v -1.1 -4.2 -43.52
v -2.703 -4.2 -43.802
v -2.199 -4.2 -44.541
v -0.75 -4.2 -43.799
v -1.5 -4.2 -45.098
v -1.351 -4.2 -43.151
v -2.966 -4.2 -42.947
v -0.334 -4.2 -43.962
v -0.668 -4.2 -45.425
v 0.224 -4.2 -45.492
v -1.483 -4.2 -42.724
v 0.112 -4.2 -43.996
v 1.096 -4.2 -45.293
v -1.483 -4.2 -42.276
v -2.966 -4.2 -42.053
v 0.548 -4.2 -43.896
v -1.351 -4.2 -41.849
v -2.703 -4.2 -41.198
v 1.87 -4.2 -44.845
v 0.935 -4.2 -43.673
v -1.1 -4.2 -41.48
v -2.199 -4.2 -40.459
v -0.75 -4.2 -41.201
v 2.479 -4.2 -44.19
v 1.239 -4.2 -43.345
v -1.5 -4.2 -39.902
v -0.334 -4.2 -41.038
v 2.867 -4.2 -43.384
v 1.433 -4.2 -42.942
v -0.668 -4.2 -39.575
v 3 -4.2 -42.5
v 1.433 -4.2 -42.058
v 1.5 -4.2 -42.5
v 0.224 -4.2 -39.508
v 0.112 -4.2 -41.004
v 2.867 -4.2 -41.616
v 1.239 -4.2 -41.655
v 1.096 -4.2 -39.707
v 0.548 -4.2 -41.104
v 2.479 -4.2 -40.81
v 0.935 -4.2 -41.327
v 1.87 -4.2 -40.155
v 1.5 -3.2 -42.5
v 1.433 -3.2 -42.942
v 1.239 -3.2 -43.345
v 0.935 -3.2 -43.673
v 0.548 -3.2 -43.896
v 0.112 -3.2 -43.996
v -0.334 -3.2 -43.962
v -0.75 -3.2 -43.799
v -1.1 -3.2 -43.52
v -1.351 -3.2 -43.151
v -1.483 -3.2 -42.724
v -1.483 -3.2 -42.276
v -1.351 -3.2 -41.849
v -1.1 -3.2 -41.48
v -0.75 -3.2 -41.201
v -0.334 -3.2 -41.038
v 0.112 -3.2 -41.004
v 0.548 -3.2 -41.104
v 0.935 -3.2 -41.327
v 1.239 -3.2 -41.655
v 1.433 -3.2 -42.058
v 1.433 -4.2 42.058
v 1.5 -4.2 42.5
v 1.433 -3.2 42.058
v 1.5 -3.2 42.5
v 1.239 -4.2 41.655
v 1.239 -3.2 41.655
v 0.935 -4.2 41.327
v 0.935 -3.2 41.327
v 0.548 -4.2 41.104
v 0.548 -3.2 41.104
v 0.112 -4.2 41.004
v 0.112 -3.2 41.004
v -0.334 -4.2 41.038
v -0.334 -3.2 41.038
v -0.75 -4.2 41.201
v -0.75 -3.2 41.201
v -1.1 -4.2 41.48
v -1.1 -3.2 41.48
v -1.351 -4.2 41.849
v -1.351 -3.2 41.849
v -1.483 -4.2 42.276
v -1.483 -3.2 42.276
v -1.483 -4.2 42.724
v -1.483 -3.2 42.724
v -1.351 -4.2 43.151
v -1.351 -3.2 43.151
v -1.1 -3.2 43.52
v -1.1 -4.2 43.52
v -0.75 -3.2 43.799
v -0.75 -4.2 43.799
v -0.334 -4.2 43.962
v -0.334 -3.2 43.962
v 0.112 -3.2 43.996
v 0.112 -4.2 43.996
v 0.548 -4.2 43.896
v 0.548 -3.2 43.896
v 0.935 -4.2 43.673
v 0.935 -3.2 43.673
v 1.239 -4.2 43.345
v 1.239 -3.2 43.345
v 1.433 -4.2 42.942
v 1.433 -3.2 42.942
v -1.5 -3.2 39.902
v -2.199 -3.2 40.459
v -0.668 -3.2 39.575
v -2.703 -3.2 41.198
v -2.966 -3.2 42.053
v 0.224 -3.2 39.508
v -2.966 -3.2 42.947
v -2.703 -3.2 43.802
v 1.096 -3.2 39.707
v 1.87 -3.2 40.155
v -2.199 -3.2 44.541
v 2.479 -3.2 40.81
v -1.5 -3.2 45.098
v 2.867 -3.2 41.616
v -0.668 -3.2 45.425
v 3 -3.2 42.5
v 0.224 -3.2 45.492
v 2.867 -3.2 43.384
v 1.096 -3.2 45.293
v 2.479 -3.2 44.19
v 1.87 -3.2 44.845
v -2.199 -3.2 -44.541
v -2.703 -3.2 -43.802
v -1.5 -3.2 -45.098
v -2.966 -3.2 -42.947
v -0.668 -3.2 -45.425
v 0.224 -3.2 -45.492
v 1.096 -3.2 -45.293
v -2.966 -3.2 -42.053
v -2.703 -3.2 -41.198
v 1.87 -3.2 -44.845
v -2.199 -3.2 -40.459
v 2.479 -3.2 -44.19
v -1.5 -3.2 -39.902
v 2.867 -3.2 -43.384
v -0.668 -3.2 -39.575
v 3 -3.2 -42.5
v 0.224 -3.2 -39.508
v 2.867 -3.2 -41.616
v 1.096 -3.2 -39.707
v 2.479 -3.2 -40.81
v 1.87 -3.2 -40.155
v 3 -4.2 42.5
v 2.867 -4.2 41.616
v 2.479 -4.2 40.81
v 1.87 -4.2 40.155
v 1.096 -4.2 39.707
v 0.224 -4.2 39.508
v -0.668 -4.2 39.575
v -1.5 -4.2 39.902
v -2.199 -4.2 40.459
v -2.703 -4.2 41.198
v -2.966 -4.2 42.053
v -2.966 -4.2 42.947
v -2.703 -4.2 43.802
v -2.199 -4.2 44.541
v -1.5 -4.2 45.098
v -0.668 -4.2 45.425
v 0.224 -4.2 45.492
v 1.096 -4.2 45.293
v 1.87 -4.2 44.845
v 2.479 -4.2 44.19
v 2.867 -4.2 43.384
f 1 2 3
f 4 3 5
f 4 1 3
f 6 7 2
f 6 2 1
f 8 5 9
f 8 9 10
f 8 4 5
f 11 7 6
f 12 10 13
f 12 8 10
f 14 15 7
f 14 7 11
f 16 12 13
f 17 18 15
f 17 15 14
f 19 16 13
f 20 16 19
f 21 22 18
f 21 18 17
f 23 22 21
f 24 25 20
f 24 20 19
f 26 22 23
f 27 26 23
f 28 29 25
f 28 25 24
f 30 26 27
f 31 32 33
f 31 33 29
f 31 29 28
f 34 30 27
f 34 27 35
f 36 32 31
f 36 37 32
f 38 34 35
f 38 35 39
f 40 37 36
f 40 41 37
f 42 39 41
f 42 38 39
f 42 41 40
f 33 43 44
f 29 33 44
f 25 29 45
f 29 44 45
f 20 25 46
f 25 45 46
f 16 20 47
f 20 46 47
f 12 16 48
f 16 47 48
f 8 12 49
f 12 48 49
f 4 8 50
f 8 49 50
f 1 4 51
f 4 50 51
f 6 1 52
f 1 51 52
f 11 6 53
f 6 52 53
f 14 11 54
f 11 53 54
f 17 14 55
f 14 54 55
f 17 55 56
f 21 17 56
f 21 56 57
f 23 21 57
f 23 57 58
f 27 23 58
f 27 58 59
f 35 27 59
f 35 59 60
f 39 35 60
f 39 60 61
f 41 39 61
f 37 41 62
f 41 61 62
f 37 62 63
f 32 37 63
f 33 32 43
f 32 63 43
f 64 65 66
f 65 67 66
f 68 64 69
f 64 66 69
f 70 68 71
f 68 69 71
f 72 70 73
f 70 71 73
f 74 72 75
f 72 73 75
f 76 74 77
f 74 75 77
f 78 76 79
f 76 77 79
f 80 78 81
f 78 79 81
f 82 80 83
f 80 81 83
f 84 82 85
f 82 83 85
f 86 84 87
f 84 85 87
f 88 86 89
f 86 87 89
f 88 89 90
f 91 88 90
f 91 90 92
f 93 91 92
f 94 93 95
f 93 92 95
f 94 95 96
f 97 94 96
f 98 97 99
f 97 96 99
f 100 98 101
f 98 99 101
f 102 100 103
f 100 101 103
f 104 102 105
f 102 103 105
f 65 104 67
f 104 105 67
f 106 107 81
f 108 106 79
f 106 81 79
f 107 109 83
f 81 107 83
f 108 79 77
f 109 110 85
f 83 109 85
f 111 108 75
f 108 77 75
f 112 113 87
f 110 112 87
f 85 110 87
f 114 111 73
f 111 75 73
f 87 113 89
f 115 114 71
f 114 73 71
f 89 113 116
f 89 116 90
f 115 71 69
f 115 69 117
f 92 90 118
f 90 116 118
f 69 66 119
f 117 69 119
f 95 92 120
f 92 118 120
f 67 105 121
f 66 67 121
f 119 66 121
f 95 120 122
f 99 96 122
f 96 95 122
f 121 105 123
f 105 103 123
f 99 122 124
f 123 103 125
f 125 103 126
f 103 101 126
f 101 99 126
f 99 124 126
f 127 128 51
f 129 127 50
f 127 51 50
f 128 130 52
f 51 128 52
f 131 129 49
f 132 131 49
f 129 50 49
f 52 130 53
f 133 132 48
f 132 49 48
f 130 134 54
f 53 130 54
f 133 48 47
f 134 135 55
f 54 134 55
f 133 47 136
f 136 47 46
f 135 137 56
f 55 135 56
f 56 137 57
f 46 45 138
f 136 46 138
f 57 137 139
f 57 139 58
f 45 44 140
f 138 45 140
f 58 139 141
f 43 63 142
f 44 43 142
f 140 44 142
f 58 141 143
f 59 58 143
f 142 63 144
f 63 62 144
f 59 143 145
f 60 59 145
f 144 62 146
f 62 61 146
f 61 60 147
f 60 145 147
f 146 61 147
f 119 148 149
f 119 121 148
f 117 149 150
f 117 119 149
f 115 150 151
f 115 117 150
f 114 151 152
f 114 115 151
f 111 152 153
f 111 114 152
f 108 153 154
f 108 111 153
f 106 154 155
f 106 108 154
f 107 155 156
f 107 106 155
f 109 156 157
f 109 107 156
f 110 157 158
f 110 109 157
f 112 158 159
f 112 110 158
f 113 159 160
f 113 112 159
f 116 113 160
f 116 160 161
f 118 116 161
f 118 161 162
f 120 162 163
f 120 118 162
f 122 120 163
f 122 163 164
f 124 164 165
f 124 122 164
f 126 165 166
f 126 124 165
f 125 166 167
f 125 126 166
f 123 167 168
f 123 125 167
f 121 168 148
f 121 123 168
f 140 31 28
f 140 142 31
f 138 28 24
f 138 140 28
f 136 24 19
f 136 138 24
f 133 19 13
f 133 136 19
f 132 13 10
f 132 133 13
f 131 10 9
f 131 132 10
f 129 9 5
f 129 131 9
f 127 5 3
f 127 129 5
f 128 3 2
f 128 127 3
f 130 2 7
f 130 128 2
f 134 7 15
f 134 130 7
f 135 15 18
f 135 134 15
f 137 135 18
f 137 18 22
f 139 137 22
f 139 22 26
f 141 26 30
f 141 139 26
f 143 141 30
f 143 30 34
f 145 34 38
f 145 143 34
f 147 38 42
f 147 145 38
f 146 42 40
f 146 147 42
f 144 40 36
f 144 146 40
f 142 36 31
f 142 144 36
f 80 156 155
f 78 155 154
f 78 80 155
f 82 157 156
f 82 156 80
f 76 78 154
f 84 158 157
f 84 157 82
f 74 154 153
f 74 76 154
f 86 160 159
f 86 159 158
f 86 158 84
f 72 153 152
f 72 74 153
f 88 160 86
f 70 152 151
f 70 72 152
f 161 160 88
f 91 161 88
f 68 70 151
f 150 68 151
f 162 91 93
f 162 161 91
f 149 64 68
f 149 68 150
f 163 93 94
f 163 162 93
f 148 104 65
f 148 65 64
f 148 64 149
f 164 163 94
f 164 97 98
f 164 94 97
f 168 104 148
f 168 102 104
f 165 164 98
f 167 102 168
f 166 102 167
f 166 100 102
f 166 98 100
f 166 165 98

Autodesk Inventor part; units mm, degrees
ref_plane "YZ Plane" through (0, 0, 0) normal (1, 0, 0) x (0, 1, 0)
ref_plane "XZ Plane" through (0, 0, 0) normal (0, 1, 0) x (-1, 0, 0)
ref_plane "XY Plane" through (0, 0, 0) normal (0, 0, 1) x (1, 0, 0)
surface "コンポジット1"
sketch "スケッチ1" plane through (-49.5, -3.2, -55.5) normal (0, -1, 0) x (1, 0, 0)
  line L0 (49.5, 98) -> (49.5, 13) construction
  circle A0 centre (49.5, 98) radius 1.5
  circle A1 centre (49.5, 13) radius 1.5
  circle A2 centre (49.5, 98) radius 3
  circle A3 centre (49.5, 13) radius 3
  circle A4 centre (2, 100.9) radius 5.4197 projected
  circle A5 centre (97, 100.9) radius 5.4197 projected
  circle A6 centre (97, 10.1) radius 5.4197 projected
  circle A7 centre (2, 10.1) radius 5.4197 projected
  arc A8 (0, 111) -> (-8, 103) centre (0, 103) ccw projected
  point P0 (49.5, 55.5)
  point P1 (49.5, 55.5)
  dimension "d0" = 85
  dimension "d1" = 3
  dimension "d2" = 6
extrude "押し出し1" add sketch "スケッチ1" along normal blind 1 contours A2 | A3
properties part number "NUC7i5-7BNK-CHASSIS"
